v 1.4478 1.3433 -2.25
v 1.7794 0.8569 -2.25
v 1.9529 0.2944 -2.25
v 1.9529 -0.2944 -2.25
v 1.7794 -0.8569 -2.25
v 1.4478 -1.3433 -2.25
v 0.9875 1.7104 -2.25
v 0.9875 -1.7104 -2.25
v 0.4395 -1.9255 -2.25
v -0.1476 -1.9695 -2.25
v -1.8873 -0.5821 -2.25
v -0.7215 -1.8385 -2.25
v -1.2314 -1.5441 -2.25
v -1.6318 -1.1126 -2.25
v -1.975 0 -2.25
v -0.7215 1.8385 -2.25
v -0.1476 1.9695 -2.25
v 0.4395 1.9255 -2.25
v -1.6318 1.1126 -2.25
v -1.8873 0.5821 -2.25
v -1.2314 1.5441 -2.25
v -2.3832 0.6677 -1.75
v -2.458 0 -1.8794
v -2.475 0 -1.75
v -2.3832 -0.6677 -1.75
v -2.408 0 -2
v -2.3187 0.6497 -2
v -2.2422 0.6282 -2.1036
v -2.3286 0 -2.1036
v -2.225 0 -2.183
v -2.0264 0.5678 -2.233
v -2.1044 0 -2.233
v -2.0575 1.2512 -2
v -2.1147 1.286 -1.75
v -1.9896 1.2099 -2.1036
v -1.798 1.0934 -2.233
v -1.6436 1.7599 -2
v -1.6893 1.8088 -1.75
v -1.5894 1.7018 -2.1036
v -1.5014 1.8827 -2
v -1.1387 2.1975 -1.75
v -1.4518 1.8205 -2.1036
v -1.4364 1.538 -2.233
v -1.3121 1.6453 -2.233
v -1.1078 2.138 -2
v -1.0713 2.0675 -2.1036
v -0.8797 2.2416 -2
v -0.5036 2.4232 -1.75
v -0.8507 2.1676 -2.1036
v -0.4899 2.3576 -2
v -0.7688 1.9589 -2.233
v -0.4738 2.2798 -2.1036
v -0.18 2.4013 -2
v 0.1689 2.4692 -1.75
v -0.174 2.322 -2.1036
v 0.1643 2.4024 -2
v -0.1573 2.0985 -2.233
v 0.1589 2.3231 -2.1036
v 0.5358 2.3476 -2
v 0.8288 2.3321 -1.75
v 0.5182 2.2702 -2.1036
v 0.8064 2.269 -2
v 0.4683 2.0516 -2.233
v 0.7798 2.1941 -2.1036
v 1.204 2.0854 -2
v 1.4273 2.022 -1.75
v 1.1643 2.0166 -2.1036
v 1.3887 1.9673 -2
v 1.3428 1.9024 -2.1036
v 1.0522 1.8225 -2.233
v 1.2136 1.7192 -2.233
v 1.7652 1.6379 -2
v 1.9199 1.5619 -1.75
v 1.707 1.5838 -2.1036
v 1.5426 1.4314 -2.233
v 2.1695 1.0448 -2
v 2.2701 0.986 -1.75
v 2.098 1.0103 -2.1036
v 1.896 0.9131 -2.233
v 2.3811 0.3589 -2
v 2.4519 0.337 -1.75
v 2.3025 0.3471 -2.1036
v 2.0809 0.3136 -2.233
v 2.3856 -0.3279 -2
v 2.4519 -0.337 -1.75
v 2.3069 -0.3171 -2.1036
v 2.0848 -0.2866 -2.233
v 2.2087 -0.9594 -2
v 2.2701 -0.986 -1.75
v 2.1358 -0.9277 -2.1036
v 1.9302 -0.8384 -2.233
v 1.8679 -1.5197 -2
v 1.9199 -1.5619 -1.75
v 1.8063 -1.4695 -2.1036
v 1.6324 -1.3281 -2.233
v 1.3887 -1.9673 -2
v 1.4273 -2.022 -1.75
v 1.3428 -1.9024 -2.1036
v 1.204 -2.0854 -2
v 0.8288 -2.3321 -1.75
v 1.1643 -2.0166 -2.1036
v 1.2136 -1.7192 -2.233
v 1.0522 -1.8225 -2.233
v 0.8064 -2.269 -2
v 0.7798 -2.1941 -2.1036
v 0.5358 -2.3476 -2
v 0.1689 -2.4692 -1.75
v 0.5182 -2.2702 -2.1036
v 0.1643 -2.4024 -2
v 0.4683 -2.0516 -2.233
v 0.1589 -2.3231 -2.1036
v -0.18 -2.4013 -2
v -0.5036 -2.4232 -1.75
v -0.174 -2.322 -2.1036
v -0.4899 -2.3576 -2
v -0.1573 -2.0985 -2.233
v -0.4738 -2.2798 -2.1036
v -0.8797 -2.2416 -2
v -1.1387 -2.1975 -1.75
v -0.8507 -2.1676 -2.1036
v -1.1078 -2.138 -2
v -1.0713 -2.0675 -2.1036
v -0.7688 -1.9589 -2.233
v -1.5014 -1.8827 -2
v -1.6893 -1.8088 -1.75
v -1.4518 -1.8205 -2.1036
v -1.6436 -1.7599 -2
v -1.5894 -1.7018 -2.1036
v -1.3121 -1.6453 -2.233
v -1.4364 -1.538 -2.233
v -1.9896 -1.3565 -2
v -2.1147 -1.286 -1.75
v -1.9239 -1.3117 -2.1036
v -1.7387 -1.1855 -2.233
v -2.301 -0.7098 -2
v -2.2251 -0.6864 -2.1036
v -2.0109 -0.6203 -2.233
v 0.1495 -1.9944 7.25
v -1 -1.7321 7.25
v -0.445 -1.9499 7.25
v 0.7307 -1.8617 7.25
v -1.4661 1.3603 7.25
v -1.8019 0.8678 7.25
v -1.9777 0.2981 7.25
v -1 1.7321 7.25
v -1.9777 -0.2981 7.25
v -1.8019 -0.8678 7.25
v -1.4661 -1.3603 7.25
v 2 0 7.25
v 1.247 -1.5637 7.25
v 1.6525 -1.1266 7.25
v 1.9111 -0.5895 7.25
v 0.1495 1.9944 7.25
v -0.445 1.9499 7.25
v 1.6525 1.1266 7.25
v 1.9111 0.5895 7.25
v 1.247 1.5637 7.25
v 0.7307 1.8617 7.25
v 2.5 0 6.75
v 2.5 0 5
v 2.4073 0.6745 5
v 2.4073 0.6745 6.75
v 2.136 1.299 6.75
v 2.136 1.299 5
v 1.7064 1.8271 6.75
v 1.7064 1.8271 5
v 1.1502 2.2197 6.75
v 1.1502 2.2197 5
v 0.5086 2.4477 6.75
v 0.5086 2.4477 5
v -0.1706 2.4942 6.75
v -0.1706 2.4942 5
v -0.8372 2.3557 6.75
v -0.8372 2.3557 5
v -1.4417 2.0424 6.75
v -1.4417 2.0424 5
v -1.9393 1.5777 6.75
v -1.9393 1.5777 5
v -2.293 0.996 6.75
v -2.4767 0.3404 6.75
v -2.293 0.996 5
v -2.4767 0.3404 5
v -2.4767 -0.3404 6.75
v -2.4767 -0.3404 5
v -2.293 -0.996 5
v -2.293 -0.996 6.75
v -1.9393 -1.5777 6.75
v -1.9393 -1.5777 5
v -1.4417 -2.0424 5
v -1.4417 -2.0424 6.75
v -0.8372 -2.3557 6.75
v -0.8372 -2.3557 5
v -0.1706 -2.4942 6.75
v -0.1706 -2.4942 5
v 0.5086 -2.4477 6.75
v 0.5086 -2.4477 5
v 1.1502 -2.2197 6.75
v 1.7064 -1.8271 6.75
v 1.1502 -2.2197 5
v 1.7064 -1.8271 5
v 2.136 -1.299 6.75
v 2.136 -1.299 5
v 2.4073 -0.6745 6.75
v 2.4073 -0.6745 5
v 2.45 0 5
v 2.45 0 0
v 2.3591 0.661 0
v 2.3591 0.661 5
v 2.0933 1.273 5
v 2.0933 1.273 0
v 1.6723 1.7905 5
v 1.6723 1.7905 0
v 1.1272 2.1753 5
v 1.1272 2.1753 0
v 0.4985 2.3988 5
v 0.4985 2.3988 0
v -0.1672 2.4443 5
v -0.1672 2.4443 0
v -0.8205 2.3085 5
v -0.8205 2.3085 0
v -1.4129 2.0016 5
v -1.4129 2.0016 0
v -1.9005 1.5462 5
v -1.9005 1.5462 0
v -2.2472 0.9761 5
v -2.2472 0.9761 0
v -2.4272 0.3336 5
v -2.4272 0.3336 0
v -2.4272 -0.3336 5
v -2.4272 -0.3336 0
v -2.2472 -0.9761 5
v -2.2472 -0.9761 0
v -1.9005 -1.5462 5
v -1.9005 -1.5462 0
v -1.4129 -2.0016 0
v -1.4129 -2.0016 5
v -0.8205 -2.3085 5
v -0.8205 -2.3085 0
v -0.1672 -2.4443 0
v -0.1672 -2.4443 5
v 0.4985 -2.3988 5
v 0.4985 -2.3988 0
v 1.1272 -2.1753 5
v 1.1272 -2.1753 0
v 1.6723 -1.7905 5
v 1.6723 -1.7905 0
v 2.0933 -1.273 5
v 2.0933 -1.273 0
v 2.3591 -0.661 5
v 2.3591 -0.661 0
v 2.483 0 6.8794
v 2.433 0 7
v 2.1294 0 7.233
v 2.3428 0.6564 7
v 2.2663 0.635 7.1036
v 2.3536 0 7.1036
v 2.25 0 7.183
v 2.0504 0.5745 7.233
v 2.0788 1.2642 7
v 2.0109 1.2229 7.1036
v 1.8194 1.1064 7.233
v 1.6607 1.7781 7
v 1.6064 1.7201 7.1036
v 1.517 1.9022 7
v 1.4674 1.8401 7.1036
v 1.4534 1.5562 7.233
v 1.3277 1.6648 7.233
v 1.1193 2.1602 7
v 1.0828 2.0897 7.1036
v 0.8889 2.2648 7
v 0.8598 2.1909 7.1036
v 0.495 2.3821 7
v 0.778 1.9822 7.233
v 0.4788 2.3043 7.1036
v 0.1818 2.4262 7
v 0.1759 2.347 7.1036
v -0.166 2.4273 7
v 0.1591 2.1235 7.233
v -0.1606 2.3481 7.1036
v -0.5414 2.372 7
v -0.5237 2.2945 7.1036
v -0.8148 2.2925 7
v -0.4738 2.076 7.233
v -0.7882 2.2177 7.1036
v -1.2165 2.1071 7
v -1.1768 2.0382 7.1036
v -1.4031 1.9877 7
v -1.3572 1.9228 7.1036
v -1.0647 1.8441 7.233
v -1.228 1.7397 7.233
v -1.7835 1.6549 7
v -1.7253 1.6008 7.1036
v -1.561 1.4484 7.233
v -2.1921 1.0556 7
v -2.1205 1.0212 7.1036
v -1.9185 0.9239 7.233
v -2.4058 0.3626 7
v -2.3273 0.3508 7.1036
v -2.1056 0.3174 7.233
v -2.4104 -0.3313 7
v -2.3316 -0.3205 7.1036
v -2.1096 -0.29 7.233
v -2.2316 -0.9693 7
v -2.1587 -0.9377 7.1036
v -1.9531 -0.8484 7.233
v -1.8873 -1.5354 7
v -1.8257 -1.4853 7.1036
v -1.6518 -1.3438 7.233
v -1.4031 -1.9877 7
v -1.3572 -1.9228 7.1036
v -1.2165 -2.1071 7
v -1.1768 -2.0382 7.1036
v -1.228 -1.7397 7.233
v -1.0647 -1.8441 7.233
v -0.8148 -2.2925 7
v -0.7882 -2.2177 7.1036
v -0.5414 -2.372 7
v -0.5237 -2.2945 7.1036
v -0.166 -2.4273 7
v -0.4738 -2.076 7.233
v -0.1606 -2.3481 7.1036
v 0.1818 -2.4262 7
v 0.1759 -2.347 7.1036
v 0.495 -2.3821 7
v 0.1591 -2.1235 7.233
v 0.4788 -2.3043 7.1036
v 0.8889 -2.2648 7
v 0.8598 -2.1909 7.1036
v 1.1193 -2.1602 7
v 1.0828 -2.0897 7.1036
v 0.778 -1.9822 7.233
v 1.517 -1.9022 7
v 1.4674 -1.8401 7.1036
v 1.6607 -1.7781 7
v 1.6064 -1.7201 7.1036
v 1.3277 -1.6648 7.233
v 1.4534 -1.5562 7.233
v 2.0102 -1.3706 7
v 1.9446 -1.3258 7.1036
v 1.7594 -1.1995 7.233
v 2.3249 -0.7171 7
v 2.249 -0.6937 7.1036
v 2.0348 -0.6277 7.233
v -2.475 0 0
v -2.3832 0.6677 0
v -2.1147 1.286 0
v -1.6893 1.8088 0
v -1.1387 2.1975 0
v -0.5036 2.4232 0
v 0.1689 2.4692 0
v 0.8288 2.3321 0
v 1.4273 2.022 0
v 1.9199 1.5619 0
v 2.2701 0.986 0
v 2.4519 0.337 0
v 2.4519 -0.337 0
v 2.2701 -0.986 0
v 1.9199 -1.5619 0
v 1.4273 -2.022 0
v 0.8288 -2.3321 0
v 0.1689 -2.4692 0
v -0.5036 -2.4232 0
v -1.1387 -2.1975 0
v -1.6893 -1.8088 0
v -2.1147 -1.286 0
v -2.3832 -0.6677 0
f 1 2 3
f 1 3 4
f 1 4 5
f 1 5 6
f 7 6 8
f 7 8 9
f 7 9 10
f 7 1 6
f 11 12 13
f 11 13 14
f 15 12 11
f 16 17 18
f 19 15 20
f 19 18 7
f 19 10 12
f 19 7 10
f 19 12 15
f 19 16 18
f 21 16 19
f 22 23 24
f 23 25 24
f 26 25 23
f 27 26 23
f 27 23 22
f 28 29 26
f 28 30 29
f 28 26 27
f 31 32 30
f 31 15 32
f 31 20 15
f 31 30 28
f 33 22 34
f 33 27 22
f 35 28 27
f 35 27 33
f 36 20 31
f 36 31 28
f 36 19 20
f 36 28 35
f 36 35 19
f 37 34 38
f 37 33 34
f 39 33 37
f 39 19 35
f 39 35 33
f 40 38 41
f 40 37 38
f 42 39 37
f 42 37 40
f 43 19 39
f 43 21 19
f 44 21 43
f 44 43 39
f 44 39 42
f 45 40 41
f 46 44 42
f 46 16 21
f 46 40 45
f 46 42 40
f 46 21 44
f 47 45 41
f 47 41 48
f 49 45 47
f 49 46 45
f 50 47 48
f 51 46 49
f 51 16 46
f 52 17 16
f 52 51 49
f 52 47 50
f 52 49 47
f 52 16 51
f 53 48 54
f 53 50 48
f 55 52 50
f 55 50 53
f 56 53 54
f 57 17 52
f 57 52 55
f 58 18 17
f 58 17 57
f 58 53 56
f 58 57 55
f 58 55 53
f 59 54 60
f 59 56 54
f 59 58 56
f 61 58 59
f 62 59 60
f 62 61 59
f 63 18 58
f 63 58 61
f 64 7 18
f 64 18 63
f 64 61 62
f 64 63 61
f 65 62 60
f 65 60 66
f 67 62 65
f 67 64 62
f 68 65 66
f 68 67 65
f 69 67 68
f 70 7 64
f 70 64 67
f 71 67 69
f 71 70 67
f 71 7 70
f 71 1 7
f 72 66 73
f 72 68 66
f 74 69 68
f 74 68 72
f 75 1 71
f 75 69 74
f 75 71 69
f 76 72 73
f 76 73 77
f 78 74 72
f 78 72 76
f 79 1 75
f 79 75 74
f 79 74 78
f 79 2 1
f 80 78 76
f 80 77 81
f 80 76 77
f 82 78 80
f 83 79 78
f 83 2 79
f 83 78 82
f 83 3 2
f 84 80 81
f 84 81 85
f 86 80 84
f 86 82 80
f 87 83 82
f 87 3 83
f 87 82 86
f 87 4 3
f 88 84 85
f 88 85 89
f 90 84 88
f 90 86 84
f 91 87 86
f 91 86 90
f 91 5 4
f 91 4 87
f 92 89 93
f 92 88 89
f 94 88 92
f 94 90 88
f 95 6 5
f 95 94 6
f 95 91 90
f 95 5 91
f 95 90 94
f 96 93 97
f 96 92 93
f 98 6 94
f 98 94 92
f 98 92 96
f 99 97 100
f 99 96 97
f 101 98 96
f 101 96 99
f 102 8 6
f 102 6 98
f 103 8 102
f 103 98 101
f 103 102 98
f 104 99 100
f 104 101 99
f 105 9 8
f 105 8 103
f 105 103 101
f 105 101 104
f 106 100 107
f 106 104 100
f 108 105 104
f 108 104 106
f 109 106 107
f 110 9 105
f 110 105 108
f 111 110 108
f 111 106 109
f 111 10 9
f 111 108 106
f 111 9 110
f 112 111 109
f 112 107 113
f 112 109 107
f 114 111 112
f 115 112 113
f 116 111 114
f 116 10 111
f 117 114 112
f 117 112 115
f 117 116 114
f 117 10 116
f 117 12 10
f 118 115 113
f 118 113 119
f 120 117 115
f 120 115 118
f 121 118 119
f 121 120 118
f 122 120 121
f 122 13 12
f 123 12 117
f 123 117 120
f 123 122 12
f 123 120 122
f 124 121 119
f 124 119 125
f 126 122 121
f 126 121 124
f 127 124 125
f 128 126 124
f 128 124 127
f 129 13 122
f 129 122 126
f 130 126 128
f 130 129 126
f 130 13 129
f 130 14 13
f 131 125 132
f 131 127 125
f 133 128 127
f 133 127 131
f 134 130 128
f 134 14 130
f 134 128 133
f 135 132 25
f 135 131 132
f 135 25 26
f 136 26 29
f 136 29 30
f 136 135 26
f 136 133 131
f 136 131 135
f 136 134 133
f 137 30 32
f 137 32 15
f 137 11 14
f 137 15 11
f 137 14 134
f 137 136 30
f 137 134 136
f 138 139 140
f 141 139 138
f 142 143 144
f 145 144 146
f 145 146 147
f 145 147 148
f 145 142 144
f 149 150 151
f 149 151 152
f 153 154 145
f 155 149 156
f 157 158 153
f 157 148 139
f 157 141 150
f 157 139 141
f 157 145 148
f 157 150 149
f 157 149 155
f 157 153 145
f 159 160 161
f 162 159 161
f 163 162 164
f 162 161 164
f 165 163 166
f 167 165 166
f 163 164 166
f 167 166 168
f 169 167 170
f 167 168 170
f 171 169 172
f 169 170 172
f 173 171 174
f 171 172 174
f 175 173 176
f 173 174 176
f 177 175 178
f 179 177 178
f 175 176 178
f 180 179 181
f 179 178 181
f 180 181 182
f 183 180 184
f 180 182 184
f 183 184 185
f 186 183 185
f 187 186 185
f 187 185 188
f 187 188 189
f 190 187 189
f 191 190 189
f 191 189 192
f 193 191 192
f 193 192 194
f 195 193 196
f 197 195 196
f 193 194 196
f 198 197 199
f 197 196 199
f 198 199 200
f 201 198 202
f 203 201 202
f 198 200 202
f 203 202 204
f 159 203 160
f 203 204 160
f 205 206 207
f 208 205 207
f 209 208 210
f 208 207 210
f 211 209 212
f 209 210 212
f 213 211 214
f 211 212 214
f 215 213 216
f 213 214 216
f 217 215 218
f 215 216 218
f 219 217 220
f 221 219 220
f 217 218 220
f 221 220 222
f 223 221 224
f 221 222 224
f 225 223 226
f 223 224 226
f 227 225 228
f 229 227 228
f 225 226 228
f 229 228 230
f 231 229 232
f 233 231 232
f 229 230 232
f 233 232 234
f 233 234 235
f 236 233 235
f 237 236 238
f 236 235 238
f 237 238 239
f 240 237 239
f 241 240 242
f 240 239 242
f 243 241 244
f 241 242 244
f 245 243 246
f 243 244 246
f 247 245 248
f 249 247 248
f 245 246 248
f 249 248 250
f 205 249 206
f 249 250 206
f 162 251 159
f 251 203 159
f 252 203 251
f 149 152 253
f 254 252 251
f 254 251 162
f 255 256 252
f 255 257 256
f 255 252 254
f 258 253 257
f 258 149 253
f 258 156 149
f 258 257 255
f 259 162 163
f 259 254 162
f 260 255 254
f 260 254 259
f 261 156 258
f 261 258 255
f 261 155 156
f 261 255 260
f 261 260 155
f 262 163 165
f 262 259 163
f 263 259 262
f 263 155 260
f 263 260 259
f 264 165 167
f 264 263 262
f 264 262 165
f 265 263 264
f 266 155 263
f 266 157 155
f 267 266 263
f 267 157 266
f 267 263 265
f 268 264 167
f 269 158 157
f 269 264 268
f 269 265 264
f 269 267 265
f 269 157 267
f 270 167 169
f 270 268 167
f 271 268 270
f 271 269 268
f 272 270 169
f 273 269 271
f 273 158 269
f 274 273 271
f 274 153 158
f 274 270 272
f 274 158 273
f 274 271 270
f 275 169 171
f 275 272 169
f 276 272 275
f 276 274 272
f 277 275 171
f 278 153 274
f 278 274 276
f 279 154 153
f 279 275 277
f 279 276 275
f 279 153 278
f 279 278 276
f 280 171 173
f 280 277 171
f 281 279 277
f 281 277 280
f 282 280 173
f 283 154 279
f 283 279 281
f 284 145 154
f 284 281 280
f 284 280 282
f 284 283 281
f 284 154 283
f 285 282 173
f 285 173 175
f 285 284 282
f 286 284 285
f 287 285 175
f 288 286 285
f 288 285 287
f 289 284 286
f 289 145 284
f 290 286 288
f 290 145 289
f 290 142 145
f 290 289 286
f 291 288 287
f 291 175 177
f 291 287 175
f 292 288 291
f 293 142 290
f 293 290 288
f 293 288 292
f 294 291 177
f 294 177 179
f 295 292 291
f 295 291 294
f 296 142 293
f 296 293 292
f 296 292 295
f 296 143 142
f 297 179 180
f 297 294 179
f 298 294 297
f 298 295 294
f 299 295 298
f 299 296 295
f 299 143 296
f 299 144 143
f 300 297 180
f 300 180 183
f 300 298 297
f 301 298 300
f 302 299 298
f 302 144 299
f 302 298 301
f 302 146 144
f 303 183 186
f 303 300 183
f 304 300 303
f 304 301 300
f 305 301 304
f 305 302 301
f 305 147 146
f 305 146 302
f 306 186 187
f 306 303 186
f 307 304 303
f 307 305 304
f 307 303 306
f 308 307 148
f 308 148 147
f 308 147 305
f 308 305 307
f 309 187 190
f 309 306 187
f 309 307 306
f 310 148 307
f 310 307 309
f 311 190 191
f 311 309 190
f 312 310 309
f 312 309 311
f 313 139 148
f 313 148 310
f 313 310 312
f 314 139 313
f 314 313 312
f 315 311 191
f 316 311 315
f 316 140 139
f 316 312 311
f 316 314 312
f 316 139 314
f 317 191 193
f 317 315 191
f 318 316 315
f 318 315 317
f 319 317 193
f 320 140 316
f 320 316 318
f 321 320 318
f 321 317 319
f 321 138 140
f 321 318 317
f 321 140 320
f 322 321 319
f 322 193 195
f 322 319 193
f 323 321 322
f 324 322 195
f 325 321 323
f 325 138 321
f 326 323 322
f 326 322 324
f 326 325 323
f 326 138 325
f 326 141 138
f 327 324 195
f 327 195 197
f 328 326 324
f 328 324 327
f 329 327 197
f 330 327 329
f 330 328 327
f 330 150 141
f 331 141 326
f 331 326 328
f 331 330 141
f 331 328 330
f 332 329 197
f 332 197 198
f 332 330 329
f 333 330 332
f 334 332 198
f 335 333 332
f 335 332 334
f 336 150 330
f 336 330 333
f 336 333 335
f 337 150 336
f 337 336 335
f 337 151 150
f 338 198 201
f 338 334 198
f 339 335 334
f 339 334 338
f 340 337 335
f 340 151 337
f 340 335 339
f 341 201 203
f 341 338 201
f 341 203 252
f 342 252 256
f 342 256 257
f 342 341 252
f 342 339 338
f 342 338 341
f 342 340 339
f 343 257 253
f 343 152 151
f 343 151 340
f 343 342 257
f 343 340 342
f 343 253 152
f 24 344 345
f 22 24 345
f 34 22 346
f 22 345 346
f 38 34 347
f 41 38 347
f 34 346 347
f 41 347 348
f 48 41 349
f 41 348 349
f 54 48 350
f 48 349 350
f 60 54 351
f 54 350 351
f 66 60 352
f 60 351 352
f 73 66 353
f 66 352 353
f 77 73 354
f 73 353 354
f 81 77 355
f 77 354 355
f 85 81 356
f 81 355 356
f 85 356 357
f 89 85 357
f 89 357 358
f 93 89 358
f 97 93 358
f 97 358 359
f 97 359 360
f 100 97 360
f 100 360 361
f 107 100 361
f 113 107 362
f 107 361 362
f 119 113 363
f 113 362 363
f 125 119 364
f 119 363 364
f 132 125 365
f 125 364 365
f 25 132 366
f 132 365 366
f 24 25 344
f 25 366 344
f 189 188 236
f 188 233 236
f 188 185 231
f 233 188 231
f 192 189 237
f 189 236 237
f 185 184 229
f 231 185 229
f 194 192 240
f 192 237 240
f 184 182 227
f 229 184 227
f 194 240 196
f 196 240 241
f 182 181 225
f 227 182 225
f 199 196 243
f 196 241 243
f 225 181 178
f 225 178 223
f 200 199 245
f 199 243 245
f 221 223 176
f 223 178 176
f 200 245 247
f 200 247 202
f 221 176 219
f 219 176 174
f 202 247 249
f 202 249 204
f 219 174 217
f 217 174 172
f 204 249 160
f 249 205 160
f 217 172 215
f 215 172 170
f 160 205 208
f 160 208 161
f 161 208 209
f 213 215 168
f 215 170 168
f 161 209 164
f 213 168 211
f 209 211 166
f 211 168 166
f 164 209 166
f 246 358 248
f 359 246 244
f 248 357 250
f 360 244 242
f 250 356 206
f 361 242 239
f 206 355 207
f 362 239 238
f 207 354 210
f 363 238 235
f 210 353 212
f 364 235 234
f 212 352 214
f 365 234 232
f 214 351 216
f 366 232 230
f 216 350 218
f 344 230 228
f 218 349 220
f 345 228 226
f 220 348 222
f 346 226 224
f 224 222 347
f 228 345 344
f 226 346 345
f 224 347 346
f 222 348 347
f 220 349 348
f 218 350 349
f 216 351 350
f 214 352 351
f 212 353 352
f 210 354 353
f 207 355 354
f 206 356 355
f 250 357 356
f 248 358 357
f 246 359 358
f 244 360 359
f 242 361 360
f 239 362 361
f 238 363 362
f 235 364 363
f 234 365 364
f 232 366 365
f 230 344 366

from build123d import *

# Parameters (mm, degrees)
SKETCH_1_R      = 2.45
EXTRUDE_1_DEPTH = 5
SKETCH_2_R      = 2.5
EXTRUDE_2_DEPTH = 2.25
SKETCH_3_R      = 2.475
EXTRUDE_3_DEPTH = 2.25
FILLET_1_R      = 0.5


with BuildPart() as part:
    # 스케치1 → 보스-돌출1 (new body)
    with BuildSketch(Plane.XY):
        Circle(SKETCH_1_R)
    extrude(amount=EXTRUDE_1_DEPTH)

    # 스케치2 → 보스-돌출2 (add)
    with BuildSketch(Plane.XY.offset(5)):
        Circle(SKETCH_2_R)
    extrude(amount=EXTRUDE_2_DEPTH)

    # 스케치3 → 보스-돌출3 (add)
    with BuildSketch(Plane(origin=(0, 0, 0), x_dir=(-1, 0, 0), z_dir=(0, 0, -1))):
        Circle(SKETCH_3_R)
    extrude(amount=EXTRUDE_3_DEPTH)

    # 필렛1
    fillet_1_edges = [part.edges().sort_by_distance(p)[0] for p in [
        (-2.5, 0, 7.25),
        (2.475, 0, -2.25),
    ]]
    fillet(fillet_1_edges, radius=FILLET_1_R)


solid = part.part
